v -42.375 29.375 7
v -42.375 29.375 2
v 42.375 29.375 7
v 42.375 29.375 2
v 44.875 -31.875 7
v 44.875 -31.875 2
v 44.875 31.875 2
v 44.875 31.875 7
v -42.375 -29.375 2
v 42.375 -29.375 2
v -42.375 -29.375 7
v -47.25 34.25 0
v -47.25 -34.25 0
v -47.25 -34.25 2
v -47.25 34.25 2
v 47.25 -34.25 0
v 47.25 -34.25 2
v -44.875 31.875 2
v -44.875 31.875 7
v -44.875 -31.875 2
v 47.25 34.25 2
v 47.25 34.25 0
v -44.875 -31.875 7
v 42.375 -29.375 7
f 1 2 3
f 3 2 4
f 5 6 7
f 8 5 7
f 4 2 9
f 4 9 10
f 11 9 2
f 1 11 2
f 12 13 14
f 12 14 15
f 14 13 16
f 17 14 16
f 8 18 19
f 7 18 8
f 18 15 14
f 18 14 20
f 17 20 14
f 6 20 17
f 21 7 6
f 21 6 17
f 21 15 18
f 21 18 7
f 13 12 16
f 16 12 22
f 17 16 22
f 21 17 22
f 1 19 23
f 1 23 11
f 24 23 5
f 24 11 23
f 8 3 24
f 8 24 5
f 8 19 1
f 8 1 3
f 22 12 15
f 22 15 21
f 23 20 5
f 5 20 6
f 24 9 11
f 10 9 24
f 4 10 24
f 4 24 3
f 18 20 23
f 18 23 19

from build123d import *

# Parameters (mm, degrees)
SKETCH_W      = 94.5
SKETCH_H      = 68.5
PAD_DEPTH     = 2
SKETCH001_W   = 89.75
SKETCH001_H   = 63.75
SKETCH001_W_2 = 84.75
SKETCH001_H_2 = 58.75
PAD001_DEPTH  = 5


with BuildPart() as part:
    # Sketch → Pad (new body)
    with BuildSketch(Plane.XY):
        Rectangle(SKETCH_W, SKETCH_H)
    extrude(amount=PAD_DEPTH)

    # Sketch001 (on Face6 of Pad) → Pad001 (join)
    with BuildSketch(Plane.XY.offset(2)):
        Rectangle(SKETCH001_W, SKETCH001_H)
        Rectangle(SKETCH001_W_2, SKETCH001_H_2, mode=Mode.SUBTRACT)
    extrude(amount=PAD001_DEPTH)


solid = part.part
